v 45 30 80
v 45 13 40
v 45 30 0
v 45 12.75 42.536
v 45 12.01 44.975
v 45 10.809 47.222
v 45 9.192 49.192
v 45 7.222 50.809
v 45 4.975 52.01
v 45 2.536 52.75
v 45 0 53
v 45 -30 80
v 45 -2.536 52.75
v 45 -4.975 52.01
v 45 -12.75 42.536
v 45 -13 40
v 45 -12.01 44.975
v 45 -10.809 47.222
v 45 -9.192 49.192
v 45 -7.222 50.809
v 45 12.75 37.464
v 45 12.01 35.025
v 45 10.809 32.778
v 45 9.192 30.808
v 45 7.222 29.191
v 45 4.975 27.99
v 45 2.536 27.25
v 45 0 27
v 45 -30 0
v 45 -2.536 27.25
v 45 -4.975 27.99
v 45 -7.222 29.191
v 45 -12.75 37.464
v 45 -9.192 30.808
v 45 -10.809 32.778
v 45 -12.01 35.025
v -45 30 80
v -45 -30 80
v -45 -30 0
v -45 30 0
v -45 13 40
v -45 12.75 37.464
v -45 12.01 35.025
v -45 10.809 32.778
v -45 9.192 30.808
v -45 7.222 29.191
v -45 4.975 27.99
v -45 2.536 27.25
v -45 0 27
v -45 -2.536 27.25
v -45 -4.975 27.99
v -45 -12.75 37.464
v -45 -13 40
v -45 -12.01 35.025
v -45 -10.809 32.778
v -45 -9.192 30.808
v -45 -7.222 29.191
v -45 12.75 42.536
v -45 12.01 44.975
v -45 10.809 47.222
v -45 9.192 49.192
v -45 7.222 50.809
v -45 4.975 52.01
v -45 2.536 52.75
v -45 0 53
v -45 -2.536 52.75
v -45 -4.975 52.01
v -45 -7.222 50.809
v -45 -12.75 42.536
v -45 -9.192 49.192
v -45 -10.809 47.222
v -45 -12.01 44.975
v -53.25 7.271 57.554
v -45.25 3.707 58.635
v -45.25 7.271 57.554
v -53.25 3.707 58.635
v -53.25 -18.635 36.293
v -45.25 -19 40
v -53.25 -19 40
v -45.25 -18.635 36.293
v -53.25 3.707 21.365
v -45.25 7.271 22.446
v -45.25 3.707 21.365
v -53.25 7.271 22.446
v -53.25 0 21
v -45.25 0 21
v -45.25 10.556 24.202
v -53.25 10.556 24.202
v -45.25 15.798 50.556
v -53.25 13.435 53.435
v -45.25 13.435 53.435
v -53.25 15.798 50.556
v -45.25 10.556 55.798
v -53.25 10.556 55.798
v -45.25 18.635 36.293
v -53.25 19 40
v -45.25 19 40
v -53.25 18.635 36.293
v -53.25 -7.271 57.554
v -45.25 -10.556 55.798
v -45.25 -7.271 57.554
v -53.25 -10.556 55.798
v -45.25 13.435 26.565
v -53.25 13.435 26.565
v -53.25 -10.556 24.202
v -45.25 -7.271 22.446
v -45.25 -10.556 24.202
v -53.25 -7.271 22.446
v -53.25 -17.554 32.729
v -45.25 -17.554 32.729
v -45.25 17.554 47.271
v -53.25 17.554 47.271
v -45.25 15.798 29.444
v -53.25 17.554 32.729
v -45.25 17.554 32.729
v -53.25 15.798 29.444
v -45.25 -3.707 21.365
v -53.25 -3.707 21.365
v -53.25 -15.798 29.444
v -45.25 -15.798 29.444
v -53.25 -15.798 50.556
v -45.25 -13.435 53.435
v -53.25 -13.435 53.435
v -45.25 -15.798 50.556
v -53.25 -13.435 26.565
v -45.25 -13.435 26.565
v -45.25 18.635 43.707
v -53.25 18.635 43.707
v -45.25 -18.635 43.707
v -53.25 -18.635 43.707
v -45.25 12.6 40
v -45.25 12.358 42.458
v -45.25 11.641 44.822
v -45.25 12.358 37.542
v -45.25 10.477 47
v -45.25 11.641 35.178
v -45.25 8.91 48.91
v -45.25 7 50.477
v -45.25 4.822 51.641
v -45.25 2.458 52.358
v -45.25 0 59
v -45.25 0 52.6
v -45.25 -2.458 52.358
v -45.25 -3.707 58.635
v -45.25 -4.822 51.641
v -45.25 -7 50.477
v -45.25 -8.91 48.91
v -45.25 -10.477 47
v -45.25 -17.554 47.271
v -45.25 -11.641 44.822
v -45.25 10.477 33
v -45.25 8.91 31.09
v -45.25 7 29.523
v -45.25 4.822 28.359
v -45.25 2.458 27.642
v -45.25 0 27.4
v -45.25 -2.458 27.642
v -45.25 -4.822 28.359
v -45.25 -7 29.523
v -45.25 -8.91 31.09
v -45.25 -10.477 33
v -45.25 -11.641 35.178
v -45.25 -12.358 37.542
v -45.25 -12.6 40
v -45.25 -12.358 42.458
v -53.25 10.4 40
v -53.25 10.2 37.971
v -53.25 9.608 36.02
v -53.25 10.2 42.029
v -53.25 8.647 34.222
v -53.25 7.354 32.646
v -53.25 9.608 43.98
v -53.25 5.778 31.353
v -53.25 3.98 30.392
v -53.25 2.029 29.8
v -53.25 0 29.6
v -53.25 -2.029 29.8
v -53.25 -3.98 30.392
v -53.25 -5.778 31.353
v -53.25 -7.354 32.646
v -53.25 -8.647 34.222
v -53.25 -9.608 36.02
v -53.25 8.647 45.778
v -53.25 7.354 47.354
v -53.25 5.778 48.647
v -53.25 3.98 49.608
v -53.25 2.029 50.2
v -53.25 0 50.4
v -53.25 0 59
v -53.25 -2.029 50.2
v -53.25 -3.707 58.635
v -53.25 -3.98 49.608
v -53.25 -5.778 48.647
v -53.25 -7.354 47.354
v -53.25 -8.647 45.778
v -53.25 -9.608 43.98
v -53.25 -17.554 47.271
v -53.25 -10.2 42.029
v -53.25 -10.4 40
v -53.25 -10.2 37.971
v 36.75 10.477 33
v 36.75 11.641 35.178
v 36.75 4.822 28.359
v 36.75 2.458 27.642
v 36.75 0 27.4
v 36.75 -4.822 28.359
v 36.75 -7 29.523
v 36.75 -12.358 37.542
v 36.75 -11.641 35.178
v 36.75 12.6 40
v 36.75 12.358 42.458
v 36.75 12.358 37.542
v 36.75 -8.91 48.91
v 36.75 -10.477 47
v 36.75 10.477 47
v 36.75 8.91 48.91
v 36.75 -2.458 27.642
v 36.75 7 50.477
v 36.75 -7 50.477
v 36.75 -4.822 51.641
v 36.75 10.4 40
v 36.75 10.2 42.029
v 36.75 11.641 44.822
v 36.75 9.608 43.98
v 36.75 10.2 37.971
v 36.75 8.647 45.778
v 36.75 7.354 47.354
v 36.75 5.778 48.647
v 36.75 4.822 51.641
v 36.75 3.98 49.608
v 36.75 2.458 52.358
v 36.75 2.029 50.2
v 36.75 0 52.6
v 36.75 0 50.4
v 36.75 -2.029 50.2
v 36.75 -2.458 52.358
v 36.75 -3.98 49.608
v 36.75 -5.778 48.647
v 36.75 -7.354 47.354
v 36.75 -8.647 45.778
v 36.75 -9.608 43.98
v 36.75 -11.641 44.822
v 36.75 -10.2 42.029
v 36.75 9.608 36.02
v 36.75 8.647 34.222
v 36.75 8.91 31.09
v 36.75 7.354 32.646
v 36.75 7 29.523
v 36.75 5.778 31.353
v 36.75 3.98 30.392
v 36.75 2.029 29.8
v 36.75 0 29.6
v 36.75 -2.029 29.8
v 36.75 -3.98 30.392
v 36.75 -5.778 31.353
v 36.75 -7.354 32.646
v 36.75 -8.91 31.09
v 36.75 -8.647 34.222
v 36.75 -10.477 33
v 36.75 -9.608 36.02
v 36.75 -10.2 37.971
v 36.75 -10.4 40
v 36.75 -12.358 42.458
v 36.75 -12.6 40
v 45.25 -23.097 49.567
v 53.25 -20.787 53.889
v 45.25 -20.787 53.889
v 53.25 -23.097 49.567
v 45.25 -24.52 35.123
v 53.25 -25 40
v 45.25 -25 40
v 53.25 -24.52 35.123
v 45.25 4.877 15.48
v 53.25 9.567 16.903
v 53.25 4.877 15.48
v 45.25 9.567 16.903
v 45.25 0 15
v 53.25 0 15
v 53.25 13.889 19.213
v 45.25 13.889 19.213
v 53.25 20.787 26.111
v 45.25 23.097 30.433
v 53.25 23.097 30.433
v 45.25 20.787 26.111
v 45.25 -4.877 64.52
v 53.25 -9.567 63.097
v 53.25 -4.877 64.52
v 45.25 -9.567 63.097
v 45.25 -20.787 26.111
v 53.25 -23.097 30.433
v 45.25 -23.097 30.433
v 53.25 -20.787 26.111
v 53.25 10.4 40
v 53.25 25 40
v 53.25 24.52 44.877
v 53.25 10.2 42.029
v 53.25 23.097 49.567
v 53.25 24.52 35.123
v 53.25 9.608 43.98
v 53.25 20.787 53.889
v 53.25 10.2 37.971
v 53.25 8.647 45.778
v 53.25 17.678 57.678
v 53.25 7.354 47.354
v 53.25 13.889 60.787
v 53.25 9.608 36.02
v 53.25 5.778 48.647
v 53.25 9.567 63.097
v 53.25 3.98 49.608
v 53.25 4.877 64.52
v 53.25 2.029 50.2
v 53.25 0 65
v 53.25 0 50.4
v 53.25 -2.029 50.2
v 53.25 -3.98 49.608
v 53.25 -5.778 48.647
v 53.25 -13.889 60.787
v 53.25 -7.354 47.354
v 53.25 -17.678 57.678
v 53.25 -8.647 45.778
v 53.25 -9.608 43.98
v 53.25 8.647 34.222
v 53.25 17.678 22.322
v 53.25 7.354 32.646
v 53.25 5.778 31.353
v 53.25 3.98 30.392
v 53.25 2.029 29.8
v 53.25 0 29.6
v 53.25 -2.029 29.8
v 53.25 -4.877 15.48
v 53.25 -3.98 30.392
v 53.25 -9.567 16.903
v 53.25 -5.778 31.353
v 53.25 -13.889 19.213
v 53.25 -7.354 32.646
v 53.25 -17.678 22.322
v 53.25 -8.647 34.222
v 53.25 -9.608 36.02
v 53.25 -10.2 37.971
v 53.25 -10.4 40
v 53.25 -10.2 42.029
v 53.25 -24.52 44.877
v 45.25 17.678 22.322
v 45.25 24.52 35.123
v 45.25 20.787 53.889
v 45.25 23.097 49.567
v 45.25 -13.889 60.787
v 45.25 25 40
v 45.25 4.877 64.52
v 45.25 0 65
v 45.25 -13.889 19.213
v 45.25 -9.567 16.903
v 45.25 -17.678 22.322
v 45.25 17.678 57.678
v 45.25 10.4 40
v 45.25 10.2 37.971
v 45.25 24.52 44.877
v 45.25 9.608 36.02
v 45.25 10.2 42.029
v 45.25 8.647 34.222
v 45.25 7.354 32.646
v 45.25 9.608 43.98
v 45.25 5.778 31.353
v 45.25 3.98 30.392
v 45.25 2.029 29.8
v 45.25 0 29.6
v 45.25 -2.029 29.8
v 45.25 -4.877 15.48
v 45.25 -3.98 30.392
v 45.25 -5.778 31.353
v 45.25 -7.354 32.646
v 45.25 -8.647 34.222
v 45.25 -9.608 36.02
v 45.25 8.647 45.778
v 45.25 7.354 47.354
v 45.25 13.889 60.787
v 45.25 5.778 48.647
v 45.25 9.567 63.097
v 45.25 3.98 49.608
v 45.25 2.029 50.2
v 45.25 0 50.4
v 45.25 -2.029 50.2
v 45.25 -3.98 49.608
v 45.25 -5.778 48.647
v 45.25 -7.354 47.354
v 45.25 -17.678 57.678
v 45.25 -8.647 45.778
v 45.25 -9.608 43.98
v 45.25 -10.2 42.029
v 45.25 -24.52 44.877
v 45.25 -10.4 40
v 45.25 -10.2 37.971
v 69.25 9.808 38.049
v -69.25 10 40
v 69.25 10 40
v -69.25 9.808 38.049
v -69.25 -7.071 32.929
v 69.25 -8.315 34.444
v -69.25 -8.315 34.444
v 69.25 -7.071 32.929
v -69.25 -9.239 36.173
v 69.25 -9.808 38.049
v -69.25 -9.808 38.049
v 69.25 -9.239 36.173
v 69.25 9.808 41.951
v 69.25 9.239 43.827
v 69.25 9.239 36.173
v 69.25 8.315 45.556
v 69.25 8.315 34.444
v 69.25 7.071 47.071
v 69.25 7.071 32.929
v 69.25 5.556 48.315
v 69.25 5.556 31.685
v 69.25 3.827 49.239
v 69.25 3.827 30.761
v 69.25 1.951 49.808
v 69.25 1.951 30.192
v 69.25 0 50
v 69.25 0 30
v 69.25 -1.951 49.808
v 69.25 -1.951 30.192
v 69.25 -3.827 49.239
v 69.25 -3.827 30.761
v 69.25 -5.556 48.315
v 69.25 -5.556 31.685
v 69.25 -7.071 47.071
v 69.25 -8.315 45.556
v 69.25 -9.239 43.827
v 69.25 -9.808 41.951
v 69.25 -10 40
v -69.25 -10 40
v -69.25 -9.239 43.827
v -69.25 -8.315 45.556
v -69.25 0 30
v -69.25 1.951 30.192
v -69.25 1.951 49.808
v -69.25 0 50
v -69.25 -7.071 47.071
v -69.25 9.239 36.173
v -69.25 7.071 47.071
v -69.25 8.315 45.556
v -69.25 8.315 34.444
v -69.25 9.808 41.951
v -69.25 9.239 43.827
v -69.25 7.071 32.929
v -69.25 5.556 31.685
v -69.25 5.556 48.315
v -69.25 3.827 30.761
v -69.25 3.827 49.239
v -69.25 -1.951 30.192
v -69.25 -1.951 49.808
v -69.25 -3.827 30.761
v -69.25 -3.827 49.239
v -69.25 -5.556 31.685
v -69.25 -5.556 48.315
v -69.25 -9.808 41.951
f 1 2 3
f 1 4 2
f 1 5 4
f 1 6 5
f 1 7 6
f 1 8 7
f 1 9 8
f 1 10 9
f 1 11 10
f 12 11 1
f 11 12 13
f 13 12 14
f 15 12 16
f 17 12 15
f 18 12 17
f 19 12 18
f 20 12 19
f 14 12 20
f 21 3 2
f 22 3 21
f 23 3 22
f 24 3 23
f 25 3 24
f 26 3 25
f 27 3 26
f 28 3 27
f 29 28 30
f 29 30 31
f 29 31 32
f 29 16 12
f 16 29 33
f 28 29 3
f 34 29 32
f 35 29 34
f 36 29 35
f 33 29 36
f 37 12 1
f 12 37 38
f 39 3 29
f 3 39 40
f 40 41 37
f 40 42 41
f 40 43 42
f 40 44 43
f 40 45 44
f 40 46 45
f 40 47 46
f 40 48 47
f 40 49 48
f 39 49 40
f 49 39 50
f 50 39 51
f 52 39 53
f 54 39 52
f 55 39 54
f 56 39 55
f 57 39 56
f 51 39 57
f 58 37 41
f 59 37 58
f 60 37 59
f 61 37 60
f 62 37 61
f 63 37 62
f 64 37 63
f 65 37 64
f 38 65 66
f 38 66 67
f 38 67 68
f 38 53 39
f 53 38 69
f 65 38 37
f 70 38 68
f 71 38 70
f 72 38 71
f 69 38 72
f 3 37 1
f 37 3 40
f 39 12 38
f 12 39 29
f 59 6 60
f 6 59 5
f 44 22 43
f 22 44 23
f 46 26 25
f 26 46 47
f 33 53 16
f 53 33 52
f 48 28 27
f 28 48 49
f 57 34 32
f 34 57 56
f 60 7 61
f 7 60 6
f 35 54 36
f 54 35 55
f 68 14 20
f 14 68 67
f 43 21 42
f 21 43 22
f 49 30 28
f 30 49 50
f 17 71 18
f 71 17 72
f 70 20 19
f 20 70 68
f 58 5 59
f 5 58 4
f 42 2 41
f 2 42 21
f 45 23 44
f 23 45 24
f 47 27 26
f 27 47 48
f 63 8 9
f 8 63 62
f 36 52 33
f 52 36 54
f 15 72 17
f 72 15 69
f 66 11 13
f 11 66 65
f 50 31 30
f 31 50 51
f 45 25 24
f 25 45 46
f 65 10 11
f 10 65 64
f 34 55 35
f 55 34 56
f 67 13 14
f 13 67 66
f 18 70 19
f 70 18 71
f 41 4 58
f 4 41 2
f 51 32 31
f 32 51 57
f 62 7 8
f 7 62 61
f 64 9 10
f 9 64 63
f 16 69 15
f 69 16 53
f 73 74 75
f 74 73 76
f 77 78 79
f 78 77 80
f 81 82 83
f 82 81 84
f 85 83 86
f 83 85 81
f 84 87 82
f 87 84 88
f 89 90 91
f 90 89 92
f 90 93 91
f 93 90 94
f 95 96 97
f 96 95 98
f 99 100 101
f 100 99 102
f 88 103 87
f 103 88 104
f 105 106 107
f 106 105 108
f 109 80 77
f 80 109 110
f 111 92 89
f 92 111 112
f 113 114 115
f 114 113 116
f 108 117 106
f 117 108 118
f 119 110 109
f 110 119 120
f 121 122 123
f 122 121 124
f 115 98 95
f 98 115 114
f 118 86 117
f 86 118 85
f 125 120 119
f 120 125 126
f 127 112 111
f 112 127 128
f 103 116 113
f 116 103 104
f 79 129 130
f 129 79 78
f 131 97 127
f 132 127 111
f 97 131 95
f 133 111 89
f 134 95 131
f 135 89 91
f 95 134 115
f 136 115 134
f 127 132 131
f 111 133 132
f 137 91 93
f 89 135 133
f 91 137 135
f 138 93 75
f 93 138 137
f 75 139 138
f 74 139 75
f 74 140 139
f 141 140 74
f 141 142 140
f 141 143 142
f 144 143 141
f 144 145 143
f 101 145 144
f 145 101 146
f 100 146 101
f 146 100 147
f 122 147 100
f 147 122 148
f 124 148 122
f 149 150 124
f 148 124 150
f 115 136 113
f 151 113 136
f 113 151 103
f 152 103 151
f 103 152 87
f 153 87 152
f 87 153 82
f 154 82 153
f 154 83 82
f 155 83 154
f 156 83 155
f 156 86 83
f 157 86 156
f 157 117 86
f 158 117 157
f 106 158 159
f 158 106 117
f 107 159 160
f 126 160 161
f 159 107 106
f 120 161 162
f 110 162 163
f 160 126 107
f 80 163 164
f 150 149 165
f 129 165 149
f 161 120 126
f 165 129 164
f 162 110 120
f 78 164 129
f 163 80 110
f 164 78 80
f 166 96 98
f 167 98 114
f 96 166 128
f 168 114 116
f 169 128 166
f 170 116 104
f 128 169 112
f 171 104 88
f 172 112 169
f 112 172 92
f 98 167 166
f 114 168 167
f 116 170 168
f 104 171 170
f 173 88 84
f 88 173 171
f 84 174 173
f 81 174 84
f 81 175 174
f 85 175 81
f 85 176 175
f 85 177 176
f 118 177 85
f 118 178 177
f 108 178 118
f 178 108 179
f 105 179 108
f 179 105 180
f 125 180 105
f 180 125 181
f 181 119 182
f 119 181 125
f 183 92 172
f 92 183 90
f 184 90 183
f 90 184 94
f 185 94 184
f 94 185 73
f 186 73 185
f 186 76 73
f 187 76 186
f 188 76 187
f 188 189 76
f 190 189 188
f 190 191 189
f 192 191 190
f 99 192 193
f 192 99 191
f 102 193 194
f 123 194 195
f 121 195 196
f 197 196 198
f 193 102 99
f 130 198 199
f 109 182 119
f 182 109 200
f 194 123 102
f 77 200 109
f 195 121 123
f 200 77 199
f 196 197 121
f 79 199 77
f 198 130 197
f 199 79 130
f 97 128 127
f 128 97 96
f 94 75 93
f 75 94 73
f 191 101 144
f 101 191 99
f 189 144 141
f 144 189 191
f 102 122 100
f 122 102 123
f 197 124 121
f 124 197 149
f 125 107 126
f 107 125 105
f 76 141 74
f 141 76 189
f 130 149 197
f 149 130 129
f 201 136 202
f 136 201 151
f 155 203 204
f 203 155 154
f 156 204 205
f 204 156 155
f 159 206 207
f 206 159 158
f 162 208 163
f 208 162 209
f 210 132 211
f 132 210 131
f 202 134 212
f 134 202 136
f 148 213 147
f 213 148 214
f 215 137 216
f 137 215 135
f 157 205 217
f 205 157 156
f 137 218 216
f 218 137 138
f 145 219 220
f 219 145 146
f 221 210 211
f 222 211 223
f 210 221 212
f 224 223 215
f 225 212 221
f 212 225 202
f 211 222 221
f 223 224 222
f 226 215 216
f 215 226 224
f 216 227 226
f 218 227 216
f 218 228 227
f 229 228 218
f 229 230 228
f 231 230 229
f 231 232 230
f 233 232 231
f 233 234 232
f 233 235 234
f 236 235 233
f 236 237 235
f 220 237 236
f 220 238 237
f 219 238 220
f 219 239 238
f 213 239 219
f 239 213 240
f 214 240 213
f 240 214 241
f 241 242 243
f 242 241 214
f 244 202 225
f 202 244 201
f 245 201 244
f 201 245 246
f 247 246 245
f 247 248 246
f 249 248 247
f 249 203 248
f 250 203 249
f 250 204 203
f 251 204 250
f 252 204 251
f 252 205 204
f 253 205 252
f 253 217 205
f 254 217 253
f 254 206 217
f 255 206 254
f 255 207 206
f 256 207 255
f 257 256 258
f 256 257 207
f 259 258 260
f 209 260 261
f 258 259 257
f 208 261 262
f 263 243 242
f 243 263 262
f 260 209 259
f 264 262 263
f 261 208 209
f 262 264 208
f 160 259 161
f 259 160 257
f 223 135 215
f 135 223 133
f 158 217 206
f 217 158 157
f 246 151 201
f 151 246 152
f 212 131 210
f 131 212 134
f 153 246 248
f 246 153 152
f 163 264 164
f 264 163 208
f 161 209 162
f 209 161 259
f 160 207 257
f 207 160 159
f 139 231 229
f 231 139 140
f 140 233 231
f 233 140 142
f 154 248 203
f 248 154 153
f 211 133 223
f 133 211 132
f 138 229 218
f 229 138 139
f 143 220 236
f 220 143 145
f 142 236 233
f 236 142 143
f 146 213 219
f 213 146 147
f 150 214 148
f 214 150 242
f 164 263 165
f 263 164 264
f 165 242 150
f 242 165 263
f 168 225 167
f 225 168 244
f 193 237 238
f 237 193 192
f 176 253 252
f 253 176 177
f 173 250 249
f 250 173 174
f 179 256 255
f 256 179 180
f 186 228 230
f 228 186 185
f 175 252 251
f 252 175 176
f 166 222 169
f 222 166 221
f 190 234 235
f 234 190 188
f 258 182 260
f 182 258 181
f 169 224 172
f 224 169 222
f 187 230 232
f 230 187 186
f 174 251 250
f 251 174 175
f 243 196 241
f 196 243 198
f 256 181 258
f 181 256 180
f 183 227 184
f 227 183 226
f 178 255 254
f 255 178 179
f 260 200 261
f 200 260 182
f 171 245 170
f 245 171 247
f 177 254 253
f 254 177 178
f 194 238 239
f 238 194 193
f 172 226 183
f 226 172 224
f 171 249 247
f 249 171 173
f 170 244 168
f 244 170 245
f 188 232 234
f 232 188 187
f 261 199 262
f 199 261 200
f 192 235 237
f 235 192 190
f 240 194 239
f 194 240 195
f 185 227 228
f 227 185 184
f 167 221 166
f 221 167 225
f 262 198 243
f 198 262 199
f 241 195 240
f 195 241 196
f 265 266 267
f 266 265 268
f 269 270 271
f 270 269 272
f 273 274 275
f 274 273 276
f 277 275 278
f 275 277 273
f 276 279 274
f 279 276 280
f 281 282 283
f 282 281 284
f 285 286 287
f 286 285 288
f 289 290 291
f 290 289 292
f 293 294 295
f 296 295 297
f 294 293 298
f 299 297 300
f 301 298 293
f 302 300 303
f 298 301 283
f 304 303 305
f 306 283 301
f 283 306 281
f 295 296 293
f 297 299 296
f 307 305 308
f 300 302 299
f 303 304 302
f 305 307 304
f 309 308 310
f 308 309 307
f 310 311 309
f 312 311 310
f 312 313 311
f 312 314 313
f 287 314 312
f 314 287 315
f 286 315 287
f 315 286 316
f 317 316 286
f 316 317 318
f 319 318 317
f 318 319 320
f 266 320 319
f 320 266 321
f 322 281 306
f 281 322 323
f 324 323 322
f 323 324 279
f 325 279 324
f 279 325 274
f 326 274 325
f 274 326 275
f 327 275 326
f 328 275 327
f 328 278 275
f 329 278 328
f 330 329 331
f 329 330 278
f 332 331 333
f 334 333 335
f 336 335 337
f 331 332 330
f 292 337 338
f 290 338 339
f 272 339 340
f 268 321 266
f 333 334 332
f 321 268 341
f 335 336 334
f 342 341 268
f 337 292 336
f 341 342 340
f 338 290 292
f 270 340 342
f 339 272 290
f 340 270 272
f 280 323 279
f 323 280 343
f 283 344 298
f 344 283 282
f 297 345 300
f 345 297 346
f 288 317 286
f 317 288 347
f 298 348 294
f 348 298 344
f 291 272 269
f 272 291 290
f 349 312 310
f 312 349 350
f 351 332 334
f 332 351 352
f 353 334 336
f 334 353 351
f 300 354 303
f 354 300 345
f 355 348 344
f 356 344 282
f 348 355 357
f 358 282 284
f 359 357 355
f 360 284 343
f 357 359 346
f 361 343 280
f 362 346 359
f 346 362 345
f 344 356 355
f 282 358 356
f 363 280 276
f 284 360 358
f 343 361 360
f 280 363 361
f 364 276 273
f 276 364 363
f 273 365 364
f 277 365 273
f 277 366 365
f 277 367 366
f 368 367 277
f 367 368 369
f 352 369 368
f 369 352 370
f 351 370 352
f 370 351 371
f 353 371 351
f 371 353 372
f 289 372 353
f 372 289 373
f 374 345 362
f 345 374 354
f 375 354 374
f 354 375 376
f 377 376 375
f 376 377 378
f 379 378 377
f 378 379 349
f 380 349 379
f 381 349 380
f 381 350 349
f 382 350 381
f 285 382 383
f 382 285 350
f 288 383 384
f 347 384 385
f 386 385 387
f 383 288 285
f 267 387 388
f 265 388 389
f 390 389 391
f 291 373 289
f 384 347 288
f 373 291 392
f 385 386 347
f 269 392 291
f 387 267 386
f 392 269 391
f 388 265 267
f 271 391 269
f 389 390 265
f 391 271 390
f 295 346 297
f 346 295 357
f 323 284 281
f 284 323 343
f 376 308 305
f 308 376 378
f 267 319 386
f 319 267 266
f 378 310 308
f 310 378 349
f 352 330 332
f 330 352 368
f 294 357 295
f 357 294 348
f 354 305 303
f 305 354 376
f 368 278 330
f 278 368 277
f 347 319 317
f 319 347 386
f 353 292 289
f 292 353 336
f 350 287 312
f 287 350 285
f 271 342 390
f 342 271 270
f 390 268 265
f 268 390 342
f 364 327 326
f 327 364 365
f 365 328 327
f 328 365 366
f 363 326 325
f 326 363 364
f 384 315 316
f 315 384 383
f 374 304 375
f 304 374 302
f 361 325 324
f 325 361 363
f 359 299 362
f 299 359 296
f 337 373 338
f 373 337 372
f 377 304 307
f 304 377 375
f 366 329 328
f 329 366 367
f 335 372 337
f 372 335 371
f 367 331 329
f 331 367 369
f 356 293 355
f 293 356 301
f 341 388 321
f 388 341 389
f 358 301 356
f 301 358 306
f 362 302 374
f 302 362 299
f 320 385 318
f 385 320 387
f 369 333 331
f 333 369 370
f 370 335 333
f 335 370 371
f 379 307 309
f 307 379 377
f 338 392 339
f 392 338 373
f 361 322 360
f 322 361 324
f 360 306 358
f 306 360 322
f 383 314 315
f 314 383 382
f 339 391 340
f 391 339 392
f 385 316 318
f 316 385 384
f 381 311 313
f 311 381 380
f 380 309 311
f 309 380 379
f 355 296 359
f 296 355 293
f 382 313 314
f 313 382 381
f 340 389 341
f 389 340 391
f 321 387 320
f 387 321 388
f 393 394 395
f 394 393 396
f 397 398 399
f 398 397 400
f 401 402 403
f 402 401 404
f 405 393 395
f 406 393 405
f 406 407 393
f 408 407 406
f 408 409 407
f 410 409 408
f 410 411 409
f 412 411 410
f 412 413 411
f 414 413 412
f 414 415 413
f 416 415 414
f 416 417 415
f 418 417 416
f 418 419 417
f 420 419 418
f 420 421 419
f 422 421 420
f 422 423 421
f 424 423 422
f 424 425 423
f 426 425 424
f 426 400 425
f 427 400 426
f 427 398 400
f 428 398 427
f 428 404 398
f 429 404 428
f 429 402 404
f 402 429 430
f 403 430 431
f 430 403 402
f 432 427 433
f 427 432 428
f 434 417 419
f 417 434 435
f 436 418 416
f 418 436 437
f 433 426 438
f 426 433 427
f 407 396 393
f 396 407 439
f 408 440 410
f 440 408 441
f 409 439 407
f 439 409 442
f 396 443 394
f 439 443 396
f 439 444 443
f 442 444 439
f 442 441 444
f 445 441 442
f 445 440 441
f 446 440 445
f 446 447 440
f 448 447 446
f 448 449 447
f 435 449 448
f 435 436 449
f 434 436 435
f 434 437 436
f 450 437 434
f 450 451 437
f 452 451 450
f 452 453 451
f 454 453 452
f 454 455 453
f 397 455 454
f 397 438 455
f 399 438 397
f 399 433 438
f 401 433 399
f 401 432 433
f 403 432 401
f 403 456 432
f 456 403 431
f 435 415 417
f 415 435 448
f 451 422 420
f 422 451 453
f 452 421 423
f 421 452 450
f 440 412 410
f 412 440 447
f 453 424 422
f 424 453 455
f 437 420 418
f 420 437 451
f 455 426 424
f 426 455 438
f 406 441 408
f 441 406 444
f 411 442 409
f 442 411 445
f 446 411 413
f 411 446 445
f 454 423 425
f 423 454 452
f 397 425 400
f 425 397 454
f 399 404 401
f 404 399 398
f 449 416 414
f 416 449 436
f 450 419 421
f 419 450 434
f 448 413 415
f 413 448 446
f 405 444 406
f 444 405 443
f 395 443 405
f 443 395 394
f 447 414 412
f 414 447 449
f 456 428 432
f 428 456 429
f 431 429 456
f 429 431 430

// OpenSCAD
$fn = 32;

// ------------------------------------------------------------------------
// Bushed housing: 90 x 60 x 80 mm housing, bushing d25.2
// Every part is its own module, assembly() places them once.
// ------------------------------------------------------------------------

// --- part 1 ---
module housing() {
  difference() {
    translate([-45, -30, 0]) cube([90, 60, 80]);
    translate([0, 0, 40]) rotate([0, 90, 0]) cylinder(h = 92, d = 26, center = true);
  }
}

// --- part 2 ---
module bushing() {
  difference() {
    union() {
      cylinder(h = 8, d = 38);
      translate([0, 0, 8]) cylinder(h = 82, d = 25.2);
    }
    translate([0, 0, -1]) cylinder(h = 92, d = 20.8);
  }
}

// --- part 3 ---
module shaft() {
  translate([0, 0, -69.25]) cylinder(h = 138.5, d = 20);
}

// --- part 4 ---
module cover() {
  difference() {
    cylinder(h = 8, d = 50);
    translate([0, 0, -1]) cylinder(h = 10, d = 20.8);
  }
}

// --- assembly ---
module assembly() {
  translate([0, 0, 0]) rotate([0, 0, 0]) housing();
  translate([-53.25, 0, 40]) rotate([0, 90, 0]) bushing();
  translate([0, 0, 40]) rotate([0, 90, 0]) shaft();
  translate([45.25, 0, 40]) rotate([0, 90, 0]) cover();
}

assembly();
